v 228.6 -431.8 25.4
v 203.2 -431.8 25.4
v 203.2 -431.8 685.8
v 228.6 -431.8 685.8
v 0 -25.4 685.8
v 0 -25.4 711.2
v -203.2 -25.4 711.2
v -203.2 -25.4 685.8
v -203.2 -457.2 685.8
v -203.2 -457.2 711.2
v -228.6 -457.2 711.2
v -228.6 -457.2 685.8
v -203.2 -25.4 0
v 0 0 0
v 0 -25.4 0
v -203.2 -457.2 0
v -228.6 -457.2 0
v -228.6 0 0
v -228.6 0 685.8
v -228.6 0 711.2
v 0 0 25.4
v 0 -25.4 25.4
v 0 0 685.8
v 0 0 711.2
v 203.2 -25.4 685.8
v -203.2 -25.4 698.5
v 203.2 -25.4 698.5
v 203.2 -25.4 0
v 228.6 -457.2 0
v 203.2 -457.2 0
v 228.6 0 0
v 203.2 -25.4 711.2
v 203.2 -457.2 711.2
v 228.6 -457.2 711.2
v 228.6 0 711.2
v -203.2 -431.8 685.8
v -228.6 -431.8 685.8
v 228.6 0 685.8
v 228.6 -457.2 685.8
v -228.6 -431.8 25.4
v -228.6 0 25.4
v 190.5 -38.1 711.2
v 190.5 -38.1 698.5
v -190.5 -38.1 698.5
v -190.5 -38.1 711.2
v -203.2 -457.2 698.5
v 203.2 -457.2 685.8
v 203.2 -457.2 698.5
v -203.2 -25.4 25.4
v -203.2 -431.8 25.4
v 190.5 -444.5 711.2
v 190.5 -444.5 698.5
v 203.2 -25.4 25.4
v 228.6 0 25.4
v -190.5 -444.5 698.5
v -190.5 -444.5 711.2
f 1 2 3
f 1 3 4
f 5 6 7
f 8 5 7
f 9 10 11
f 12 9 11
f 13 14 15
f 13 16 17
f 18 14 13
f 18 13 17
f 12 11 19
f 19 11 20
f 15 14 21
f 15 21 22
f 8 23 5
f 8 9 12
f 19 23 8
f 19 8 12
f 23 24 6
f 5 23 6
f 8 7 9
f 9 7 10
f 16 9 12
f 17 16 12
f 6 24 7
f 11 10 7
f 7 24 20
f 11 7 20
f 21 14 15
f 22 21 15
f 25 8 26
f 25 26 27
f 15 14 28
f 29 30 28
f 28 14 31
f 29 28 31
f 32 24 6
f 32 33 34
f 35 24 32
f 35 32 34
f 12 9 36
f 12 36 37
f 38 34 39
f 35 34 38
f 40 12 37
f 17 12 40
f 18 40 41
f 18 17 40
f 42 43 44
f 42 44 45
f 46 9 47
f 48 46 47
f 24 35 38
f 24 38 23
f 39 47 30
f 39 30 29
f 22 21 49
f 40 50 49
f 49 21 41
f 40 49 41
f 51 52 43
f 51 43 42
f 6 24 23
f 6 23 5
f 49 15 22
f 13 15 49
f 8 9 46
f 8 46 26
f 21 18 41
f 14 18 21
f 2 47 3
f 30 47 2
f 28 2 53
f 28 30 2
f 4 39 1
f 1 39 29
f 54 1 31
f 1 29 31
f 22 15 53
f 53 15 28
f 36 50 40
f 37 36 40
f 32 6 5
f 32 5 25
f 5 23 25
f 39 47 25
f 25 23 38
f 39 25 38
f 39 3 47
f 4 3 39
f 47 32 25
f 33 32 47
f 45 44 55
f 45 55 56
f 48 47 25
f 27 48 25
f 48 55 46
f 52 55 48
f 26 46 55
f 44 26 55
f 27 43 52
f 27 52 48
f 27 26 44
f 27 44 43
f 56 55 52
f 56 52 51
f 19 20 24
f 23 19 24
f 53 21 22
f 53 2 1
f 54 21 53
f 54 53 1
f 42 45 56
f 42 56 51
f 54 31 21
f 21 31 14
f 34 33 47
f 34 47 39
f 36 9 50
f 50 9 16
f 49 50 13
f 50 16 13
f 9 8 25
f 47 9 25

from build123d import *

# Parameters (mm, degrees)
F1_DEPTH = 25.4
F4_W     = 25.4
F4_H     = 25.4
F5_DEPTH = 660.4
F8_W     = 406.4
F8_H     = 431.8
F9_DEPTH = 25.4
F12_W    = 12.7
F12_H    = 12.7


with BuildPart() as f1:
    # F0 (on Top) → F1 (new body)
    with BuildSketch(Plane.XY):
        Polygon((228.6, 0), (0, 0), (0, -25.4), (203.2, -25.4), (203.2, -457.2), (228.6, -457.2), (228.6, -25.4), align=None)
    extrude(amount=F1_DEPTH)


with BuildPart() as f3_1:
    # F3: instance of F1
    add(f1.part.mirror(Plane.XY.offset(355.6)))


with BuildPart() as f1_1:
    add(f1.part)

    # F4 (on face) → F5 (join)
    with BuildSketch(Plane.XY.offset(25.4)):
        with Locations((215.9, -444.5)):
            Rectangle(F4_W, F4_H)
    extrude(amount=F5_DEPTH)


with BuildPart() as f6_1:
    # F6: instance of F3_1
    add(f3_1.part.mirror(Plane.YZ))


with BuildPart() as f6_2:
    # F6: instance of F1
    add(f1_1.part.mirror(Plane.YZ))


with BuildPart() as f9:
    # F8 (on offset) → F9 (new body)
    with BuildSketch(Plane.XY.offset(685.8)):
        with Locations((0, -241.3)):
            Rectangle(F8_W, F8_H)
    extrude(amount=F9_DEPTH)

    # F13: sweep along a path in F10
    with BuildLine(Plane.XY.offset(711.2)) as f13_path:
        Line((-190.5, -444.5), (-190.5, -38.1))
        Line((-190.5, -38.1), (190.5, -38.1))
        Line((190.5, -38.1), (190.5, -444.5))
        Line((190.5, -444.5), (-190.5, -444.5))
    # F12 (on offset) → F13 (sweep, cut)
    with BuildSketch(Plane.XZ.offset(444.5)):
        with Locations((-196.85, 704.85)):
            Rectangle(F12_W, F12_H)
    sweep(path=f13_path.line, transition=Transition.RIGHT, mode=Mode.SUBTRACT)


solid = Compound([f3_1.part, f1_1.part, f6_1.part, f6_2.part, f9.part])
